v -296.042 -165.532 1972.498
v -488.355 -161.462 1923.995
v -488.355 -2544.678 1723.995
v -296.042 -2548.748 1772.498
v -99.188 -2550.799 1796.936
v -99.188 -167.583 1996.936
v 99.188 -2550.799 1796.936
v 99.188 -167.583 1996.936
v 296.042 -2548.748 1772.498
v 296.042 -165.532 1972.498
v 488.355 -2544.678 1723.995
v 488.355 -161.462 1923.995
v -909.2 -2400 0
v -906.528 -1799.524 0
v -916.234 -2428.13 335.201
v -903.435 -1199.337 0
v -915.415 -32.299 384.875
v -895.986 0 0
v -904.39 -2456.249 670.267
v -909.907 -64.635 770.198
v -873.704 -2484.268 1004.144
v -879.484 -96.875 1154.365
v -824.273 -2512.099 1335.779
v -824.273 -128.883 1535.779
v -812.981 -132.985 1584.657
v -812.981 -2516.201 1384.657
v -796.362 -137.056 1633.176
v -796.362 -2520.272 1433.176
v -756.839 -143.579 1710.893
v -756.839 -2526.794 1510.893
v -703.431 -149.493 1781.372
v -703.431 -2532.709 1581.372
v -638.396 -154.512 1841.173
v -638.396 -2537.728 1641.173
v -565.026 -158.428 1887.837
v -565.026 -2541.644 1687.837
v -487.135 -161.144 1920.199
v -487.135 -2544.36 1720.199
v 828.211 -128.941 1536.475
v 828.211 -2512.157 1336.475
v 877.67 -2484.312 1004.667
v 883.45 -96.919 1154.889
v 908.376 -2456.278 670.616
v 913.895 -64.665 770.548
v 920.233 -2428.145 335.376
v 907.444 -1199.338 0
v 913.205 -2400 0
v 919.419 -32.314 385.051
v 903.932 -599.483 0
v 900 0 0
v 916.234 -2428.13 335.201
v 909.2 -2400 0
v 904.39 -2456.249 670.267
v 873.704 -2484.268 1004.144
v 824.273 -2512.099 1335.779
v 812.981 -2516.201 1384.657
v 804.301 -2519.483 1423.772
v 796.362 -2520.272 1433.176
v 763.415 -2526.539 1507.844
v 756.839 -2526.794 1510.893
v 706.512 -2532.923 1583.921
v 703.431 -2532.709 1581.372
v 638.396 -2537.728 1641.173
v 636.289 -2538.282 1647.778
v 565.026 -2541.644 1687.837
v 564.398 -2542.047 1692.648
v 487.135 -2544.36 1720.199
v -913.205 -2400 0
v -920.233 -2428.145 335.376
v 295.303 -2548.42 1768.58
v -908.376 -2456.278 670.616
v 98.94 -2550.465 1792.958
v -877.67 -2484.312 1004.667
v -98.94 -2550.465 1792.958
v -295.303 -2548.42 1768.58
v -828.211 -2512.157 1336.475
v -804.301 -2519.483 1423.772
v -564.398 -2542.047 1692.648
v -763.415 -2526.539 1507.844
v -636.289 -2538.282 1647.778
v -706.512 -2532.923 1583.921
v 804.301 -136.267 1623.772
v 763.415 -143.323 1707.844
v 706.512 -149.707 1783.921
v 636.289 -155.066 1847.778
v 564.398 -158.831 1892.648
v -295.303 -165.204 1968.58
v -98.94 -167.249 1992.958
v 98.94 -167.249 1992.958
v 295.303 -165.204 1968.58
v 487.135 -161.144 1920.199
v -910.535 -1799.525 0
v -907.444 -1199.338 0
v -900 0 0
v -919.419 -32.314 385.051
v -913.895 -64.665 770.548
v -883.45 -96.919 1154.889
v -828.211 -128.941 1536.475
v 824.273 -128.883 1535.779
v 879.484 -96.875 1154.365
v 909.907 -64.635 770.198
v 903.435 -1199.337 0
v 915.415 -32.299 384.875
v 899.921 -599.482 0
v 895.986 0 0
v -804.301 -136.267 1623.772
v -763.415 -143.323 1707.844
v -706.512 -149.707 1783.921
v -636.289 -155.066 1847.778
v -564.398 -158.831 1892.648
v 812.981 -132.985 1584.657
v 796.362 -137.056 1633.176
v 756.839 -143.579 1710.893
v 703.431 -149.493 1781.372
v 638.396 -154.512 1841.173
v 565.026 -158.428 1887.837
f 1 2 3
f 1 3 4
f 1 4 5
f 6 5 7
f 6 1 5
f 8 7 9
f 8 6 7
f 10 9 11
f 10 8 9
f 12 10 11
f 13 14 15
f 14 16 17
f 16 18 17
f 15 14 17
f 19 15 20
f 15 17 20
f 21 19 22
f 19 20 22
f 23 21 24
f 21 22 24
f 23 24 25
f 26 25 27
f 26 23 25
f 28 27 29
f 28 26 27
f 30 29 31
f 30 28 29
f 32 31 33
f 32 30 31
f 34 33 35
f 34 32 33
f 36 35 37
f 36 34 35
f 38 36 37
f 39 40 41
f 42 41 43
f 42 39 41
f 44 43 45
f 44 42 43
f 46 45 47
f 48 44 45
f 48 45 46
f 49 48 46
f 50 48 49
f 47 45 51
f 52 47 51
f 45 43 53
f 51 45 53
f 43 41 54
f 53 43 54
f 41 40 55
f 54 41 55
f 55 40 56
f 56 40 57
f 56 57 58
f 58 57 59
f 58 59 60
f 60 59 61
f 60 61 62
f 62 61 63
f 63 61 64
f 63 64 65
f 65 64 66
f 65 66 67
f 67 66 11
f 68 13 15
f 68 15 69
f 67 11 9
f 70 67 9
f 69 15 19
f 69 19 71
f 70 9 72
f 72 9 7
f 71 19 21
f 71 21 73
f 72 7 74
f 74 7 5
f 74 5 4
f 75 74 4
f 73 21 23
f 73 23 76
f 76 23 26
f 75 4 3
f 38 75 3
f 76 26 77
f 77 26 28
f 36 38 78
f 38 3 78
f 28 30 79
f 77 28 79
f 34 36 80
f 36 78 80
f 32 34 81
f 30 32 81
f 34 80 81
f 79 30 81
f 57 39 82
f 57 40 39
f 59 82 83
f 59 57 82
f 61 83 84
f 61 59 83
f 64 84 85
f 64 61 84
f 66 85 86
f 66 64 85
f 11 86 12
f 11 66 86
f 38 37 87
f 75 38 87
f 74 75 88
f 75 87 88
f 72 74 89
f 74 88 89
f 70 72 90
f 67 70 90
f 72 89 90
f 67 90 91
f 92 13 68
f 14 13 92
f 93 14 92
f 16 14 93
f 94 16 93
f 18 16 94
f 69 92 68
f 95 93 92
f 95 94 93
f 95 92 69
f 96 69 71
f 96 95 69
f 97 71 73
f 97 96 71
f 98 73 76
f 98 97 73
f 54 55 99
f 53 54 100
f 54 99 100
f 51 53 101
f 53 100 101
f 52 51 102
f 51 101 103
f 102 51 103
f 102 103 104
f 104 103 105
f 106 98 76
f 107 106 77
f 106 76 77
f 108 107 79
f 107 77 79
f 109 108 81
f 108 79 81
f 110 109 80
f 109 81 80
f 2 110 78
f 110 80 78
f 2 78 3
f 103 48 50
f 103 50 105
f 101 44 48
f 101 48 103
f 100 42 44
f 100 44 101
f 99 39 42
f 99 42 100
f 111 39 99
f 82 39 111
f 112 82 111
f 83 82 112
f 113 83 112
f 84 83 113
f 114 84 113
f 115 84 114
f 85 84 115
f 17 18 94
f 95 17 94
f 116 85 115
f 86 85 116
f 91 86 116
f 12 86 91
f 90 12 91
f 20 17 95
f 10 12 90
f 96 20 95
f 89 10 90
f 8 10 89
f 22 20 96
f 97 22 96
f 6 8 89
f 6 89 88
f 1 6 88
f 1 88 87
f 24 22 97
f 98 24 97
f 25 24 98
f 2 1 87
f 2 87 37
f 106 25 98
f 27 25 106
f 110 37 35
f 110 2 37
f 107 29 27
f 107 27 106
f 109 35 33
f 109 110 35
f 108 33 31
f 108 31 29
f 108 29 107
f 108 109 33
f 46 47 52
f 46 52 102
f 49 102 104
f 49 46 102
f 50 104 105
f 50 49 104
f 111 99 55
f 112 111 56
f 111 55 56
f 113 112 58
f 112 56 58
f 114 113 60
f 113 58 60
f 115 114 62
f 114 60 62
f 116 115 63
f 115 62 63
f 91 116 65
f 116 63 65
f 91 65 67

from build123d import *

# Parameters (mm, degrees)
F3_DEPTH = 2391.5932546919
F4_R     = 500
F5_W     = 3357.9323291779
F5_H     = 1677.524805069
F6_DEPTH = 1000
F7_T     = -4


with BuildPart() as f3:
    # F2 (on line) → F3 (new body, through all)
    with BuildSketch(Plane(origin=(0, 0, 0), x_dir=(-1, 0, 0), z_dir=(0, 0.9964971895, 0.0836262603))):
        with BuildLine():
            ThreePointArc((-775, 1807.0302467124), (-906.0837789516, 908.2593562679), (-900, 0))
            Line((-900, 0), (900, 0))
            ThreePointArc((900, 0), (906.0837789516, 908.2593562679), (775, 1807.0302467124))
            ThreePointArc((775, 1807.0302467124), (0, 2007.0302467124), (-775, 1807.0302467124))
        make_face()
    extrude(amount=-F3_DEPTH)

    # F4
    f4_edges = [f3.edges().sort_by_distance(p)[0] for p in [
        (775, -1342.72316, 1700.700562),
        (-775, -1342.72316, 1700.700562),
    ]]
    fillet(f4_edges, radius=F4_R)

    # F5 (on Right) → F6 (cut, symmetric)
    with BuildSketch(Plane.YZ):
        with Locations((-1678.9661645889, -838.7624025345)):
            Rectangle(F5_W, F5_H)
    extrude(amount=F6_DEPTH, both=True, mode=Mode.SUBTRACT)

    # F7
    f7_openings = [f3.faces().sort_by_distance(p)[0] for p in [
        (0, -78.481532, 935.192192),
        (0, -2470.159262, 836.023363),
        (0, -1202.911074, 0),
    ]]
    offset(amount=F7_T, openings=f7_openings, kind=Kind.INTERSECTION)


solid = f3.part
